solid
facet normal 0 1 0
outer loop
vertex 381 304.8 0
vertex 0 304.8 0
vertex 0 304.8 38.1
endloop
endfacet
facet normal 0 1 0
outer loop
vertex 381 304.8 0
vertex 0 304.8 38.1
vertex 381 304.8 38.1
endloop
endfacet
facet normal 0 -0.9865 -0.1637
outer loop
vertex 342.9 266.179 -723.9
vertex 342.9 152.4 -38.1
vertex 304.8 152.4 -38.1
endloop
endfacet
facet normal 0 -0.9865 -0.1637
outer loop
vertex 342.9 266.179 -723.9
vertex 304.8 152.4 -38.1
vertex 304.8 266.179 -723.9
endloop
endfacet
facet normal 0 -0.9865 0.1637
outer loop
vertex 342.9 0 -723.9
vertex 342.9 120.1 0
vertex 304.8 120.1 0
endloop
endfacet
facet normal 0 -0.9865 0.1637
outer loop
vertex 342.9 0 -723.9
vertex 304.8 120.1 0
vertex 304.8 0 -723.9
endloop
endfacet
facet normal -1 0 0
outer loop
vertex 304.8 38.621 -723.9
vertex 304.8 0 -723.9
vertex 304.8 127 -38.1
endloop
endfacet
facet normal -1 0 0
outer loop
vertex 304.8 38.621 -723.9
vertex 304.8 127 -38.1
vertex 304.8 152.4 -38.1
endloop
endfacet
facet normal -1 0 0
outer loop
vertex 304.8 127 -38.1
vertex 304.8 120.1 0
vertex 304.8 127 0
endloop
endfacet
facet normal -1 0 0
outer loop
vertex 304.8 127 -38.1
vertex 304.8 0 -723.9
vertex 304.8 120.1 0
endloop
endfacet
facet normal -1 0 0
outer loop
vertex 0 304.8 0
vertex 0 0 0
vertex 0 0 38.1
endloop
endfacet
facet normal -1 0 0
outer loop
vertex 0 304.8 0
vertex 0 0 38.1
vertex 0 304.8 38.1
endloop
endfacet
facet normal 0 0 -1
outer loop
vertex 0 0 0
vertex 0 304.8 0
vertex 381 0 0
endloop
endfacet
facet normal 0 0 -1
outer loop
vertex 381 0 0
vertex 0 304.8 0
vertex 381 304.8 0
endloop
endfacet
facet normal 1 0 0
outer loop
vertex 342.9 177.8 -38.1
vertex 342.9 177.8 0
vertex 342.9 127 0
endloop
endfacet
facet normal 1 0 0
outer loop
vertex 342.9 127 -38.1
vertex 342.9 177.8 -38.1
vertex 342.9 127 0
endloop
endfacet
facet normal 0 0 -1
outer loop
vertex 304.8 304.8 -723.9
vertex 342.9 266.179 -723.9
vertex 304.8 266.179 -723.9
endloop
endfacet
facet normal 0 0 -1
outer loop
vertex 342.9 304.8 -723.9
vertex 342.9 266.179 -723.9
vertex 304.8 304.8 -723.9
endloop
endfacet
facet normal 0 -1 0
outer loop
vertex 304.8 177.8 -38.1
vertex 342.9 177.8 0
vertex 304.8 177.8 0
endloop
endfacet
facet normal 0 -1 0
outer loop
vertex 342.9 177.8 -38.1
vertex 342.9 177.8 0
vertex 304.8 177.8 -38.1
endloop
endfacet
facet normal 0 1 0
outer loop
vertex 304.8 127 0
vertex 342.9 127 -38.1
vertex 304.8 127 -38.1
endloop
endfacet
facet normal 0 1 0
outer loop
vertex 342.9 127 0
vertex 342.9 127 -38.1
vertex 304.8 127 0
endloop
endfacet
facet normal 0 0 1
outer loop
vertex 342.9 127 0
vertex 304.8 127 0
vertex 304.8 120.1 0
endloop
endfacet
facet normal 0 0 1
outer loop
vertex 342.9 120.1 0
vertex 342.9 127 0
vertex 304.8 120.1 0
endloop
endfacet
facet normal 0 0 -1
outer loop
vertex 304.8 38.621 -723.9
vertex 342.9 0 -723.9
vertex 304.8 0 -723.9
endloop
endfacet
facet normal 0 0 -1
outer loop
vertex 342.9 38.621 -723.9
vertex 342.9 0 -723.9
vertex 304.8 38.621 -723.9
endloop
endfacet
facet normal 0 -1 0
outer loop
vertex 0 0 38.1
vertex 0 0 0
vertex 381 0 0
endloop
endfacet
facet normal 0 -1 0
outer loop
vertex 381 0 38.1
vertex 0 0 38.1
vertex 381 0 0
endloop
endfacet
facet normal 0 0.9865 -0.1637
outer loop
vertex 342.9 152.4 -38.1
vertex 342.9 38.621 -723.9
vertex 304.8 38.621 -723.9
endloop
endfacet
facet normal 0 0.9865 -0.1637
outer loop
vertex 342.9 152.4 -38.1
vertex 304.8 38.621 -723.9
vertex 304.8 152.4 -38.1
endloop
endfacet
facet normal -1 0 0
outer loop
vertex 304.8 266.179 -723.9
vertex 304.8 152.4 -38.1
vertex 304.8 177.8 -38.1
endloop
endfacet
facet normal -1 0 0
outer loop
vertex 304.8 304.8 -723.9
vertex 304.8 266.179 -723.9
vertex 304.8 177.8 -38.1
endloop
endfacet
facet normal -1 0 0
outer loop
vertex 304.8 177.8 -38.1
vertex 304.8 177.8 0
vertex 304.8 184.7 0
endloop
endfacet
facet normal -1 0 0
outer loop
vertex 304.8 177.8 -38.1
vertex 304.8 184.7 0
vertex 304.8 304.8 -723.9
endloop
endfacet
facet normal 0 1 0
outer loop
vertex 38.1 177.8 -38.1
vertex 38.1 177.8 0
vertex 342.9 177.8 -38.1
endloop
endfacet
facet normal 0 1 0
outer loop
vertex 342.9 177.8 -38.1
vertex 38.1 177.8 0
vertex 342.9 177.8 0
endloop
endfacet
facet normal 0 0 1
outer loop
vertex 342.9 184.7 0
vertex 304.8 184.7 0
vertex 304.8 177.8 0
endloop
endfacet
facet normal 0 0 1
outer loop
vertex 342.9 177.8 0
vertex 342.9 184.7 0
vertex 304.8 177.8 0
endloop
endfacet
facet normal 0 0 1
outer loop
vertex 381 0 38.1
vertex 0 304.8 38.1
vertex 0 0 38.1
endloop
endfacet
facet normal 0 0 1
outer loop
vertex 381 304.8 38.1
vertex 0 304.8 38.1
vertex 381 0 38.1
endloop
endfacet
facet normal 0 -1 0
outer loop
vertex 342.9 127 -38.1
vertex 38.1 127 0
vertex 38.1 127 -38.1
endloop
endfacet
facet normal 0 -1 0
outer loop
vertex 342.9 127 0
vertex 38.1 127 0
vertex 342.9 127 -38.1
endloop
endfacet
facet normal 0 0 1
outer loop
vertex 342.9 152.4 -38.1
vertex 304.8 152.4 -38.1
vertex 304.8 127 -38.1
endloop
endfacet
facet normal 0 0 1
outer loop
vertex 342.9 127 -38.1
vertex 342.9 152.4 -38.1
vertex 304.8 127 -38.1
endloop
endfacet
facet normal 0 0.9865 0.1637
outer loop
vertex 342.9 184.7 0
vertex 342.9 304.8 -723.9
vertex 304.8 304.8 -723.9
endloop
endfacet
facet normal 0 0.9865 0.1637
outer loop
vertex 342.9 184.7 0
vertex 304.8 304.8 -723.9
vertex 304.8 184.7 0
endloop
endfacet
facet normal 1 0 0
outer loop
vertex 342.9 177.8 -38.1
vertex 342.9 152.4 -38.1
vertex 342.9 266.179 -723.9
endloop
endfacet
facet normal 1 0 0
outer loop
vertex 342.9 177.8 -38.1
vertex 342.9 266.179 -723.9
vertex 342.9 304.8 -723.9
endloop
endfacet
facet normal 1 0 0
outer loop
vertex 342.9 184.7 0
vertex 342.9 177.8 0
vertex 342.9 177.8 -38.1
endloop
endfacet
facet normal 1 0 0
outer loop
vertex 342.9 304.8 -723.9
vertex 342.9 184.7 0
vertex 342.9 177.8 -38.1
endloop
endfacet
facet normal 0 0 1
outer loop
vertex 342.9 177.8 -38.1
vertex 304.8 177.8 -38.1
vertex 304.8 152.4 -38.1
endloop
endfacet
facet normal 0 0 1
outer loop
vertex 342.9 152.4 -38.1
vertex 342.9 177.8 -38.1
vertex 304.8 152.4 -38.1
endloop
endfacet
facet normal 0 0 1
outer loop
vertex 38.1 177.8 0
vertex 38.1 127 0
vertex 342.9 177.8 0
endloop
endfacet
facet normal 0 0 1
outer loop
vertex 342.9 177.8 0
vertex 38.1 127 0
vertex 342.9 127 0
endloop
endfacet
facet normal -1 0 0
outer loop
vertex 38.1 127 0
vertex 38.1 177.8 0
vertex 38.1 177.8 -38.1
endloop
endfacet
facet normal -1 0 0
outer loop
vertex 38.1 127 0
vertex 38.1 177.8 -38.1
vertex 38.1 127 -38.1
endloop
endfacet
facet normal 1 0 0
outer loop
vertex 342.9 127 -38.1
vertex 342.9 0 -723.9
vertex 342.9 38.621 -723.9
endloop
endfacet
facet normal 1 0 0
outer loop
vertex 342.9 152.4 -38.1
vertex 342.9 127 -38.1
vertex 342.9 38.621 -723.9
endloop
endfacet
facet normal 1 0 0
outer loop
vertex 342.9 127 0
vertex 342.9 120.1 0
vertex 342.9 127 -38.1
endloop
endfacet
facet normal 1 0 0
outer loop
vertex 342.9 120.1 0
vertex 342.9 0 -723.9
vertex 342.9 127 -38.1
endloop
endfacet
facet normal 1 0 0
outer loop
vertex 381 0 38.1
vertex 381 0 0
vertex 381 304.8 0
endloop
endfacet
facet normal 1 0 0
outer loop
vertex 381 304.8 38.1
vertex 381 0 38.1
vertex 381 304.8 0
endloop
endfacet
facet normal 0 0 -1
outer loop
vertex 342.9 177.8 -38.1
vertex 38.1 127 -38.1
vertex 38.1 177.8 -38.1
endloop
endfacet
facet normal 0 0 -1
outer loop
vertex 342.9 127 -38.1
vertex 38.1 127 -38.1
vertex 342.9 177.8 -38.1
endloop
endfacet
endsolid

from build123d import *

# Parameters (mm, degrees)
F0_W     = 381
F0_H     = 304.8
F1_DEPTH = 38.1
F2_W     = 304.8
F2_H     = 50.8
F3_DEPTH = 38.1
F5_DEPTH = 38.1


with BuildPart() as f1:
    # F0 (on Top) → F1 (new body)
    with BuildSketch(Plane.XY):
        with Locations((190.5, 152.4)):
            Rectangle(F0_W, F0_H)
    extrude(amount=F1_DEPTH)


with BuildPart() as f3:
    # F2 (on face) → F3 (new body)
    with BuildSketch(Plane(origin=(0, 0, 0), x_dir=(1, 0, 0), z_dir=(0, 0, -1))):
        with Locations((190.5, -152.4)):
            Rectangle(F2_W, F2_H)
    extrude(amount=F3_DEPTH)


with BuildPart() as f5:
    # F4 (on face) → F5 (new body)
    with BuildSketch(Plane.YZ.offset(342.9)):
        Polygon((127, 0), (120.100271, 0), (0, -723.9), (38.620796, -723.9), (152.4, -38.1), (127, -38.1), align=None)
        Polygon((177.8, -38.1), (152.4, -38.1), (266.179204, -723.9), (304.8, -723.9), (184.699729, 0), (177.8, 0), align=None)
    extrude(amount=-F5_DEPTH)


solid = Compound([f1.part, f3.part, f5.part])
